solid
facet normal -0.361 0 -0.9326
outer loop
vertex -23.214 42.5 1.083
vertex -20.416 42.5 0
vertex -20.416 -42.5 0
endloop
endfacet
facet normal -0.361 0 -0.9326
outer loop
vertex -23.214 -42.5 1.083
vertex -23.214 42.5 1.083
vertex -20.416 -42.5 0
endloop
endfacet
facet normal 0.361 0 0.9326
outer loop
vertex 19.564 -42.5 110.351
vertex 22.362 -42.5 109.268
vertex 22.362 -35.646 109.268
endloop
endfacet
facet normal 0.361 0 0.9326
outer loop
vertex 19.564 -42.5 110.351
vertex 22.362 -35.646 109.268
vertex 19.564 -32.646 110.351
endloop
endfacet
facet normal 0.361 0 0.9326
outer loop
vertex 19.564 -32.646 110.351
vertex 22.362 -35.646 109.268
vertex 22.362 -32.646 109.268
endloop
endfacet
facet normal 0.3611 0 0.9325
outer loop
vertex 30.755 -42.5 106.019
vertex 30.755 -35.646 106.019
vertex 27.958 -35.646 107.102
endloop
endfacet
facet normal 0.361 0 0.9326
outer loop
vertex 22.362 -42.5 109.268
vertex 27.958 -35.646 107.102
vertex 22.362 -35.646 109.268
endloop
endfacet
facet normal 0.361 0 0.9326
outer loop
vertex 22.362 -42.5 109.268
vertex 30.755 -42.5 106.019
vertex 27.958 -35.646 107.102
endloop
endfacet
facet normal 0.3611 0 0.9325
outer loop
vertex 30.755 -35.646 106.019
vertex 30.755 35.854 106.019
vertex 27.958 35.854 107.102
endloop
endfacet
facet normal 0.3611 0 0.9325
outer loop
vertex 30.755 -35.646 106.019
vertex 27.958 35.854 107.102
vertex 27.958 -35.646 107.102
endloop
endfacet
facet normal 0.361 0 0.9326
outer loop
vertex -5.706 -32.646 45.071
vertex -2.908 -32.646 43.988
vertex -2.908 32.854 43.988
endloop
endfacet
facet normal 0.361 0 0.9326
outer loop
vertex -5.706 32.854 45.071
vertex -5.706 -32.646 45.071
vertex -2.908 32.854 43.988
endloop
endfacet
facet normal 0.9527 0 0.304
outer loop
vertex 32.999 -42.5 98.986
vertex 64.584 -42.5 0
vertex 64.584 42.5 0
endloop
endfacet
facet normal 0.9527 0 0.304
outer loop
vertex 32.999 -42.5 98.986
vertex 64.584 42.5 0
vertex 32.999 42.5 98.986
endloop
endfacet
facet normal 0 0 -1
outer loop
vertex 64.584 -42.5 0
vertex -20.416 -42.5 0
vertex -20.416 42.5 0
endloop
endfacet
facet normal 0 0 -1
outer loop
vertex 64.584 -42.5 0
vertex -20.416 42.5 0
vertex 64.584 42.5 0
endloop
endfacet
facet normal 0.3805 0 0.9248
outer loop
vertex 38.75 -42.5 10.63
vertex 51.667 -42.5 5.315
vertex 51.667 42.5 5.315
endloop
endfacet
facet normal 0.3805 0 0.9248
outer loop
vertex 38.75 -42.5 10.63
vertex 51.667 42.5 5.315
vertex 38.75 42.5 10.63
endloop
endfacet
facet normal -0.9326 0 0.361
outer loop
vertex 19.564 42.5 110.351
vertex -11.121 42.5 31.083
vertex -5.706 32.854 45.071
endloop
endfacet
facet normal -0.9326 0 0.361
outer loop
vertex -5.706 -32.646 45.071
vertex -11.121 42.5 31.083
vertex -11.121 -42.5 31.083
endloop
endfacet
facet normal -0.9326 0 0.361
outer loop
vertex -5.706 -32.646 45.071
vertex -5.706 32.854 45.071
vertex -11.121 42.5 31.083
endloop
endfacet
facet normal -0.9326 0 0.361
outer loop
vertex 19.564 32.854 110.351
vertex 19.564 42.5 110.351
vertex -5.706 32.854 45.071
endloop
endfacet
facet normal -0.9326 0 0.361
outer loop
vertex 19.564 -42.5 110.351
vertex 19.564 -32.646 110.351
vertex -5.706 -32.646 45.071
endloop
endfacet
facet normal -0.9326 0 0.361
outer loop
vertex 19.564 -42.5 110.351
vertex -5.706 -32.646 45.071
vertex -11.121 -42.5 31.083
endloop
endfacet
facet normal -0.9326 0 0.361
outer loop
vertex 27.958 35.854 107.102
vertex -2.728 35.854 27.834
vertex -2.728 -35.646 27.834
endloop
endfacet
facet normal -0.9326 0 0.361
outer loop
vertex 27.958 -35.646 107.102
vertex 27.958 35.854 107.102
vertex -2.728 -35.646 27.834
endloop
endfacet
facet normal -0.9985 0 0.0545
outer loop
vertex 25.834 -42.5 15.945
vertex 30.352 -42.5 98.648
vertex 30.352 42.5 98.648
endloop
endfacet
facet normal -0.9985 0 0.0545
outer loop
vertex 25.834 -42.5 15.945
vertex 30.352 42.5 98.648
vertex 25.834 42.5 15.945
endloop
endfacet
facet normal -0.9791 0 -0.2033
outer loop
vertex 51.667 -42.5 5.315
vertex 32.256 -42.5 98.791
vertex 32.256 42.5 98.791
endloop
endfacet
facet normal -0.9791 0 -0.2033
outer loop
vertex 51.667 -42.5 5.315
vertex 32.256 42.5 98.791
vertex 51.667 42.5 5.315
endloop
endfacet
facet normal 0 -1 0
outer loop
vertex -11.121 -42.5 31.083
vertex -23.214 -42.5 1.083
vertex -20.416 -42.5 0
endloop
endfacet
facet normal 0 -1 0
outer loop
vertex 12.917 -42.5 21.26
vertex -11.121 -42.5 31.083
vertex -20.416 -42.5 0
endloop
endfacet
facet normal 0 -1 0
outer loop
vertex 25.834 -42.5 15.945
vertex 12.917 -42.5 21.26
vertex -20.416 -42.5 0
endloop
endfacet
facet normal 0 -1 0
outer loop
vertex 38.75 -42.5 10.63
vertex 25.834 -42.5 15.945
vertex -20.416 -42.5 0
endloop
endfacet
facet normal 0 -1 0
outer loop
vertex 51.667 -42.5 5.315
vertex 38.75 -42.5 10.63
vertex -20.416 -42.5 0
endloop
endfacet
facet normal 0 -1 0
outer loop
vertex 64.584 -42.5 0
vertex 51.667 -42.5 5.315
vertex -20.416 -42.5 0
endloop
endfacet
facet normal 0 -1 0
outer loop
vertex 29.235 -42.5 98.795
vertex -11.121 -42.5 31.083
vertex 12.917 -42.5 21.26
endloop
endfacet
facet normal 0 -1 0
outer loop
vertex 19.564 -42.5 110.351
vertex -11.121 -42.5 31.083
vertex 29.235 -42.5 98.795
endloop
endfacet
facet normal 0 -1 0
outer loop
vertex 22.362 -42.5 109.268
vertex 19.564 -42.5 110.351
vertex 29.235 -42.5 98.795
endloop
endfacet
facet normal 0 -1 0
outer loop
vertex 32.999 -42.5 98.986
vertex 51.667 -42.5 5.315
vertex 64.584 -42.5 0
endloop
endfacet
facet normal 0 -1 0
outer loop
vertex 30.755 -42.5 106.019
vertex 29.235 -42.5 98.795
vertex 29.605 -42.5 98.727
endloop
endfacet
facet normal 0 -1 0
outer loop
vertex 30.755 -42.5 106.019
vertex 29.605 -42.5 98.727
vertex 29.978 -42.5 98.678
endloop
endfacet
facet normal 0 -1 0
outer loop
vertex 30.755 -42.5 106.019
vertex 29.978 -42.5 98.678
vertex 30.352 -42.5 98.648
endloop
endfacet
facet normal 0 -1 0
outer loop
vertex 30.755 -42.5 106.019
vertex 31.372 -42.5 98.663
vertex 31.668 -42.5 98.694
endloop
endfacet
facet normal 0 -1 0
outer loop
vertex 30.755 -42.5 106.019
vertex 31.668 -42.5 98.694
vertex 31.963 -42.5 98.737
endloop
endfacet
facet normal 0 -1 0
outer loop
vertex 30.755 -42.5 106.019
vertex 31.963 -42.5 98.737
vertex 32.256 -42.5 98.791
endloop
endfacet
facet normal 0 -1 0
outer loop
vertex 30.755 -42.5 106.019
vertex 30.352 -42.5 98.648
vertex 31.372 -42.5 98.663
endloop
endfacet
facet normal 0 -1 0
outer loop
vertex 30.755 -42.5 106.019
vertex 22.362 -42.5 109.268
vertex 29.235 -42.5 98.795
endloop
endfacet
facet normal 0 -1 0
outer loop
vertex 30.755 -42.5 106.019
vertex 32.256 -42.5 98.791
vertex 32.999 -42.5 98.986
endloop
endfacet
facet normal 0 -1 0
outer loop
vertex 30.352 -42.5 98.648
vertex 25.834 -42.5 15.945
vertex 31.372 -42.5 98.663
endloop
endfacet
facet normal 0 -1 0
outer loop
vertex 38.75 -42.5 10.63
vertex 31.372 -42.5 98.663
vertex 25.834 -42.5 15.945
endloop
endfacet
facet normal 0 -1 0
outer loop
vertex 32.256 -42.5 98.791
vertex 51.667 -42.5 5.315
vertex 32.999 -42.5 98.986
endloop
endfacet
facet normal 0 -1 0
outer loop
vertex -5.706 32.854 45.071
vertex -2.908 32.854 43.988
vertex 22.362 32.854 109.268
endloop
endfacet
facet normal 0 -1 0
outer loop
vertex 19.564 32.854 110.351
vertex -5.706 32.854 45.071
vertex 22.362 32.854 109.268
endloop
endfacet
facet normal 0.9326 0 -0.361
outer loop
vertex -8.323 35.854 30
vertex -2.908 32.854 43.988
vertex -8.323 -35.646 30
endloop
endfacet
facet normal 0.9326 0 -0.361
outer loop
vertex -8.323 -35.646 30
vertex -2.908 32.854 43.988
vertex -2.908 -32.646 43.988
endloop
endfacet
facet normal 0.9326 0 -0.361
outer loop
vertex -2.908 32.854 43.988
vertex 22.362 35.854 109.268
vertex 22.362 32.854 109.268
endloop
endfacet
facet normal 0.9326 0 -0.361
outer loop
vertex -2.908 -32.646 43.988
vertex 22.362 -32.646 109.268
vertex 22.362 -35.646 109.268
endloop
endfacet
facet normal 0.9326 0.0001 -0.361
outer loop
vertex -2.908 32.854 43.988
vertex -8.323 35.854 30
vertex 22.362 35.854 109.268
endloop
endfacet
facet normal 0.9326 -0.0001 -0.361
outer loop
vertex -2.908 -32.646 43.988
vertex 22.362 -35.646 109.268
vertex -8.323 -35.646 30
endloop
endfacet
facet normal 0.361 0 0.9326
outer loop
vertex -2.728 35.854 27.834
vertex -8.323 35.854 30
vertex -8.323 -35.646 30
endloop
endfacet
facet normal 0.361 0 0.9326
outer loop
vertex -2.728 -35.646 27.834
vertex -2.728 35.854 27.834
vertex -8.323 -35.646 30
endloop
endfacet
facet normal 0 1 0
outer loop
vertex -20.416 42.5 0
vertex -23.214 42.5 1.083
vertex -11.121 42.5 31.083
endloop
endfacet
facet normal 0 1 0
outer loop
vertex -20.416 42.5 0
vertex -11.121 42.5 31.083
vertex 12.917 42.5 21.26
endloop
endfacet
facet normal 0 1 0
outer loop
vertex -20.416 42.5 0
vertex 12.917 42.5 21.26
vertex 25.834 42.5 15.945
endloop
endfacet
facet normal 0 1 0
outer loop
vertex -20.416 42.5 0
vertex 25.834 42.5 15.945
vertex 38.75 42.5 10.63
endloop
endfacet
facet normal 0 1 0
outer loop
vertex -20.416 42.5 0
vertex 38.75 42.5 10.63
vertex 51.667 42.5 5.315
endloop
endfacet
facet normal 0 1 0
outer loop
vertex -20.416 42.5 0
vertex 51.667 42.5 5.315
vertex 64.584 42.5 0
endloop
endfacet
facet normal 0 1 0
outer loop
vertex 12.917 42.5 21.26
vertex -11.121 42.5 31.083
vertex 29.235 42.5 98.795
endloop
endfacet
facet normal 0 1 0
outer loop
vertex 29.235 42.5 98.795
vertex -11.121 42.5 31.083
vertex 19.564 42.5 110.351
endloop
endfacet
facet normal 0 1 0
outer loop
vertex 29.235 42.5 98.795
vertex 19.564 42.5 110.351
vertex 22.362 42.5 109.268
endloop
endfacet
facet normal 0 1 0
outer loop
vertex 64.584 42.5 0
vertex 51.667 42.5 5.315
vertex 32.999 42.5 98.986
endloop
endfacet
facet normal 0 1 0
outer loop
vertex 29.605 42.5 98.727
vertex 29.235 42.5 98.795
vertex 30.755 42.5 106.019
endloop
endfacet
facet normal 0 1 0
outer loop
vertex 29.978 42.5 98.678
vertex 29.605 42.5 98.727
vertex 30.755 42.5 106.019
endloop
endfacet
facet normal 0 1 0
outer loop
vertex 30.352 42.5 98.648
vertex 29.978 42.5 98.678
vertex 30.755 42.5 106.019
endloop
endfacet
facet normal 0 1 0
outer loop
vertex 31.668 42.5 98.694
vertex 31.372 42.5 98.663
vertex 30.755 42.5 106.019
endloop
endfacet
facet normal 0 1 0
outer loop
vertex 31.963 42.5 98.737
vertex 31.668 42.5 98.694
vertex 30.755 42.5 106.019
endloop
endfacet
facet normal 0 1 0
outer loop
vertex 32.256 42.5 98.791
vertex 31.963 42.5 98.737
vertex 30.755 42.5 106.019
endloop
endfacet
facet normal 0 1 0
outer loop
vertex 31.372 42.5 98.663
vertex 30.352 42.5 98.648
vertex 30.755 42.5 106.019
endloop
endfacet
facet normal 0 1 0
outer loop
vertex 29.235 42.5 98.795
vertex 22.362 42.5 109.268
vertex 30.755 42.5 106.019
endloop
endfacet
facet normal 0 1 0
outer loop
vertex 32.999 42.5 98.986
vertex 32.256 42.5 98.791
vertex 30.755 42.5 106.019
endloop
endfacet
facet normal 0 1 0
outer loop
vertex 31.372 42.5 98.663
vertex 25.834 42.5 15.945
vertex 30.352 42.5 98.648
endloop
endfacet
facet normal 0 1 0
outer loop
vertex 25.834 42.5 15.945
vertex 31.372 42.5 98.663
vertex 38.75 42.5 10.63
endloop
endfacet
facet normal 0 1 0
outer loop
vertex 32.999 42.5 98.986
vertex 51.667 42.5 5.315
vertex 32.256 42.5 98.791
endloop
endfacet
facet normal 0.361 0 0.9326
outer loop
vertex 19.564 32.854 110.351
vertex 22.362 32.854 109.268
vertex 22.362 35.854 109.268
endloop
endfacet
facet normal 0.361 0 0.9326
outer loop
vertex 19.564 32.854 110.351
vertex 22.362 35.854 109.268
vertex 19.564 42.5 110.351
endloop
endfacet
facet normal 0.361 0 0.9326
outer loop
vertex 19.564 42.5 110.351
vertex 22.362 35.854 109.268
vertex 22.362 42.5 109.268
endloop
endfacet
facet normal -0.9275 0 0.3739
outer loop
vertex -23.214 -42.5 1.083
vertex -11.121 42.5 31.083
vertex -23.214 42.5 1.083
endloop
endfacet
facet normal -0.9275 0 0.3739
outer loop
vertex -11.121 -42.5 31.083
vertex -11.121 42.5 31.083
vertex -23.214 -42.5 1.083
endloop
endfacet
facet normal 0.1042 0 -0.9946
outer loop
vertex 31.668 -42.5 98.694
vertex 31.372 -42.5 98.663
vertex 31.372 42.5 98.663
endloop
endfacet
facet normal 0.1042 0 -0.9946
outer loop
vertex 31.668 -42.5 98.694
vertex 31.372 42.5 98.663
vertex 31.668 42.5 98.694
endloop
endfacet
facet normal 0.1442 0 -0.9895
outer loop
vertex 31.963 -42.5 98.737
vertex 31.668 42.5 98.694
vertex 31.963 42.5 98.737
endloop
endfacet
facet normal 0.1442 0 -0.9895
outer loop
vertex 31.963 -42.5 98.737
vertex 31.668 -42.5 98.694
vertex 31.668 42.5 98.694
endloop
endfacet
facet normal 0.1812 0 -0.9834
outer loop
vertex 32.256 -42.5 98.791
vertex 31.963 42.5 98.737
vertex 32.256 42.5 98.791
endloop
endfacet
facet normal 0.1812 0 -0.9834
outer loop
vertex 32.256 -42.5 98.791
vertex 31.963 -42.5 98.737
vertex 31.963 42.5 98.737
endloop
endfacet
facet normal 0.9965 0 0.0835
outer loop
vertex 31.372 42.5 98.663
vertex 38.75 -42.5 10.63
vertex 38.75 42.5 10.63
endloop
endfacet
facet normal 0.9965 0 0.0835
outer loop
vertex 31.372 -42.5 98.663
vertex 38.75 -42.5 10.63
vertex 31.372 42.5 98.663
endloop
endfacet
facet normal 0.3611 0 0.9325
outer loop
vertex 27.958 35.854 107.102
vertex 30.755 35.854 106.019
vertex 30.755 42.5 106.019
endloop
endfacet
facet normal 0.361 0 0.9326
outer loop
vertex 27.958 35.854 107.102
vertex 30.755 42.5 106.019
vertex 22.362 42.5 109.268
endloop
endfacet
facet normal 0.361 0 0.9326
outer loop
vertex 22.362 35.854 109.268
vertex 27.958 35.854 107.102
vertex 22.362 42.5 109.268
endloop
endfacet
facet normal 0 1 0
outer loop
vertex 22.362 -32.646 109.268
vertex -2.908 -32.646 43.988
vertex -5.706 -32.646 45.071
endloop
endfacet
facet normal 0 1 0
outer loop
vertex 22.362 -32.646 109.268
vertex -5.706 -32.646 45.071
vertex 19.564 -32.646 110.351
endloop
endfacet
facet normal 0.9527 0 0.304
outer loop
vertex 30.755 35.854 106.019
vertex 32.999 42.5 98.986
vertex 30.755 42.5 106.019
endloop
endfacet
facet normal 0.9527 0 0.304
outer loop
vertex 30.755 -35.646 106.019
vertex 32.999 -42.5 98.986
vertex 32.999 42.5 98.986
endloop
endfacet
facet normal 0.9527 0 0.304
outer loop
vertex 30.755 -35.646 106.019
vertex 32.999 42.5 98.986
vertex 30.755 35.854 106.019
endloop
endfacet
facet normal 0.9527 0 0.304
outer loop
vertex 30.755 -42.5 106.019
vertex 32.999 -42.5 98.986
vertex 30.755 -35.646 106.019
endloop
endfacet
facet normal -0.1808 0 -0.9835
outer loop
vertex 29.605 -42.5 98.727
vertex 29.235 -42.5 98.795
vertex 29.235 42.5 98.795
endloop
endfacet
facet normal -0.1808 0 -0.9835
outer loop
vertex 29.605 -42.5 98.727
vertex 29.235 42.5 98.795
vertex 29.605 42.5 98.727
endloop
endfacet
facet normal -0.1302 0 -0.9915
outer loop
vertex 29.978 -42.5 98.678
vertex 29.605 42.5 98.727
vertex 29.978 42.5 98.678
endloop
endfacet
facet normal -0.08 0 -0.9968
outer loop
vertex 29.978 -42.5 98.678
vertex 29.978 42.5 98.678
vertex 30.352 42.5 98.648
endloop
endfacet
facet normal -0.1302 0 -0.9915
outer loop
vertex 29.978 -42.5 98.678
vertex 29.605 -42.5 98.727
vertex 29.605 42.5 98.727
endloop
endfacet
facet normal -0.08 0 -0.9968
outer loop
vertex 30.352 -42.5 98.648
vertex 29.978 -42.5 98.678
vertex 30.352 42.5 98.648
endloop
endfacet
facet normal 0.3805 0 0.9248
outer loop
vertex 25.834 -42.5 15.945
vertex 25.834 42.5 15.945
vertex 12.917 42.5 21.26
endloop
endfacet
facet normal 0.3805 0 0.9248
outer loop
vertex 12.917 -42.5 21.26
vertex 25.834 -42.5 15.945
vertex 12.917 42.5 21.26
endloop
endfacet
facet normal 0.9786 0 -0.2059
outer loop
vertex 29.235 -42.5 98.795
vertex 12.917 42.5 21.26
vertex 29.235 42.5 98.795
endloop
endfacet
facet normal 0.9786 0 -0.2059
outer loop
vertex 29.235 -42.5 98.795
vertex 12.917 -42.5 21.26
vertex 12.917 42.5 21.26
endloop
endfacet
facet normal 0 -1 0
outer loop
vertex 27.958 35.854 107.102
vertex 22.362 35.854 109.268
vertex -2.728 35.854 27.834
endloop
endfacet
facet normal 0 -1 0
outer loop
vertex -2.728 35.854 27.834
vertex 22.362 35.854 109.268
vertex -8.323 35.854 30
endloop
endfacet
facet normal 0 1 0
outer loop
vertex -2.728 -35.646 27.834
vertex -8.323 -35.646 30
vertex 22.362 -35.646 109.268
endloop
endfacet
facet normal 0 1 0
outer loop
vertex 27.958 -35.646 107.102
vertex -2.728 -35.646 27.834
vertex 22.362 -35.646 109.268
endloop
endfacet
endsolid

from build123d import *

# Parameters (mm, degrees)
F1_DEPTH  = 42.5
F2_W      = 3
F2_H      = 70
F2_W_2    = 65.5
F3_DEPTH  = 9
F3_FACE_W = 71.5
F3_FACE_H = 85
F4_DEPTH  = 3


with BuildPart() as f1:
    # F0 (on Front) → F1 (new body, symmetric)
    with BuildSketch(Plane.XZ):
        Polygon((22.3621103702, 109.2680796906), (-8.3229273872, 30), (0, 26.5752547967), (28.090155991, 99.1349922478), (30.7552011609, 106.0190756927), align=None)
        with BuildLine():
            Line((28.090155991, 99.1349922478), (0, 26.5752547967))
            Line((0, 26.5752547967), (12.916813397, 21.2602024521))
            Line((12.916813397, 21.2602024521), (29.2348995336, 98.7953817902))
            ThreePointArc((29.2348995336, 98.7953817902), (28.6556498353, 98.9420032142), (28.090155991, 99.1349922478))
        make_face()
        with BuildLine():
            Line((30.3524578973, 98.6481280943), (30.7552011609, 106.0190756927))
            Line((30.7552011609, 106.0190756927), (29.2348995336, 98.7953817902))
            ThreePointArc((29.2348995336, 98.7953817902), (29.7908639139, 98.7003924567), (30.3524578973, 98.6481280943))
        make_face()
        with BuildLine():
            Line((31.3717730218, 98.662927939), (30.7552011609, 106.0190756927))
            Line((30.7552011609, 106.0190756927), (30.3524578973, 98.6481280943))
            ThreePointArc((30.3524578973, 98.6481280943), (30.8623712412, 98.637911475), (31.3717730218, 98.662927939))
        make_face()
        with BuildLine():
            Line((30.7552011609, 106.0190756927), (28.090155991, 99.1349922478))
            ThreePointArc((28.090155991, 99.1349922478), (28.6556498353, 98.9420032142), (29.2348995336, 98.7953817902))
            Line((29.2348995336, 98.7953817902), (30.7552011609, 106.0190756927))
        make_face()
        with BuildLine():
            Line((32.2561050406, 98.7913265148), (30.7552011609, 106.0190756927))
            Line((30.7552011609, 106.0190756927), (31.3717730218, 98.662927939))
            ThreePointArc((31.3717730218, 98.662927939), (31.8158836896, 98.713733592), (32.2561050406, 98.7913265148))
        make_face()
        with BuildLine():
            ThreePointArc((32.2561050406, 98.7913265148), (32.6301854549, 98.8792224357), (32.9991851562, 98.9864654757))
            Line((32.9991851562, 98.9864654757), (30.7552011609, 106.0190756927))
            Line((30.7552011609, 106.0190756927), (32.2561050406, 98.7913265148))
        make_face()
        with BuildLine():
            Line((25.8336267941, 15.9451501074), (38.7504401911, 10.6300977628))
            Line((38.7504401911, 10.6300977628), (31.3717730218, 98.662927939))
            ThreePointArc((31.3717730218, 98.662927939), (30.8623712412, 98.637911475), (30.3524578973, 98.6481280943))
            Line((30.3524578973, 98.6481280943), (25.8336267941, 15.9451501074))
        make_face()
        with BuildLine():
            Line((51.6672535881, 5.3150454182), (64.5840501522, 0))
            Line((64.5840501522, 0), (32.9991851562, 98.9864654757))
            ThreePointArc((32.9991851562, 98.9864654757), (32.6301854549, 98.8792224357), (32.2561050406, 98.7913265148))
            Line((32.2561050406, 98.7913265148), (51.6672535881, 5.3150454182))
        make_face()
        Polygon((-8.3229273872, 30), (-20.4159498478, 0), (64.5840501522, 0), (51.6672535881, 5.3150454182), (38.7504401911, 10.6300977628), (25.8336267941, 15.9451501074), (12.916813397, 21.2602024521), (0, 26.5752547967), align=None)
    extrude(amount=F1_DEPTH, both=True)

    # F2 (on face) → F3 (cut)
    with BuildSketch(Plane(origin=(-17.3379708436, 0, 6.7116081536), x_dir=(0, -1, 0), z_dir=(-0.9325656434, 0, 0.3610004442))):
        with Locations((34.1458392143, 74.9723888187)):
            Rectangle(F2_W, F2_H)
        with Locations((-0.1041607857, 74.9723888187)):
            Rectangle(F2_W_2, F2_H)
        with Locations((-34.3541607857, 74.9723888187)):
            Rectangle(F2_W, F2_H)
        Polygon((-35.8541607857, 35.0806618999), (-35.8541607857, 24.9723888187), (-32.8541607857, 24.9723888187), (-32.8541607857, 39.9723888187), (-35.8541607857, 39.9723888187), align=None)
        Polygon((-32.8541607857, 39.9723888187), (-32.8541607857, 24.9723888187), (-0.1041607857, 24.9723888187), (32.6458392143, 24.9723888187), (32.6458392143, 39.9723888187), align=None)
        Polygon((32.6458392143, 39.9723888187), (32.6458392143, 24.9723888187), (35.6458392143, 24.9723888187), (35.6458392143, 35.0806618999), (35.6458392143, 39.9723888187), align=None)
    extrude(amount=-F3_DEPTH, mode=Mode.SUBTRACT)

    # F3_face (on face) + F2 (on face) + F1_face1 (on face) → F4 (join)
    with BuildSketch(Plane(origin=(15.4126822823, 0.1041607857, 66.3850358474), x_dir=(0, -1, 0), z_dir=(-0.9325656434, 0, 0.3610004442))):
        Rectangle(F3_FACE_W, F3_FACE_H)
    with BuildSketch(Plane(origin=(-17.3379708436, 0, 6.7116081536), x_dir=(0, -1, 0), z_dir=(-0.9325656434, 0, 0.3610004442))):
        with Locations((-34.3541607857, 74.9723888187)):
            Rectangle(F2_W, F2_H)
        Polygon((-35.8541607857, 35.0806618999), (-35.8541607857, 24.9723888187), (-32.8541607857, 24.9723888187), (-32.8541607857, 39.9723888187), (-35.8541607857, 39.9723888187), align=None)
        Polygon((-32.8541607857, 39.9723888187), (-32.8541607857, 24.9723888187), (-0.1041607857, 24.9723888187), (32.6458392143, 24.9723888187), (32.6458392143, 39.9723888187), align=None)
        Polygon((32.6458392143, 39.9723888187), (32.6458392143, 24.9723888187), (35.6458392143, 24.9723888187), (35.6458392143, 35.0806618999), (35.6458392143, 39.9723888187), align=None)
        with Locations((34.1458392143, 74.9723888187)):
            Rectangle(F2_W, F2_H)
        Polygon((-42.5, 24.9723888187), (-35.8541607857, 24.9723888187), (-35.8541607857, 35.0806618999), (-35.8541607857, 39.9723888187), (-35.8541607857, 109.9723888187), (-42.5, 109.9723888187), align=None)
        Polygon((35.6458392143, 35.0806618999), (35.6458392143, 24.9723888187), (42.5, 24.9723888187), (42.5, 109.9723888187), (35.6458392143, 109.9723888187), (35.6458392143, 39.9723888187), align=None)
    with BuildSketch(Plane(origin=(-14.3694386175, 0, 15), x_dir=(0, -1, 0), z_dir=(-0.9274816955, 0, 0.3738685658))):
        Polygon((-35.8541607857, 16.1728259144), (-42.5, 16.1728259144), (-42.5, -16.1728259144), (42.5, -16.1728259144), (42.5, 16.1728259144), (35.6458392143, 16.1728259144), align=None)
    extrude(amount=F4_DEPTH, dir=(-0.9325656434, 0, 0.3610004442))


solid = f1.part
